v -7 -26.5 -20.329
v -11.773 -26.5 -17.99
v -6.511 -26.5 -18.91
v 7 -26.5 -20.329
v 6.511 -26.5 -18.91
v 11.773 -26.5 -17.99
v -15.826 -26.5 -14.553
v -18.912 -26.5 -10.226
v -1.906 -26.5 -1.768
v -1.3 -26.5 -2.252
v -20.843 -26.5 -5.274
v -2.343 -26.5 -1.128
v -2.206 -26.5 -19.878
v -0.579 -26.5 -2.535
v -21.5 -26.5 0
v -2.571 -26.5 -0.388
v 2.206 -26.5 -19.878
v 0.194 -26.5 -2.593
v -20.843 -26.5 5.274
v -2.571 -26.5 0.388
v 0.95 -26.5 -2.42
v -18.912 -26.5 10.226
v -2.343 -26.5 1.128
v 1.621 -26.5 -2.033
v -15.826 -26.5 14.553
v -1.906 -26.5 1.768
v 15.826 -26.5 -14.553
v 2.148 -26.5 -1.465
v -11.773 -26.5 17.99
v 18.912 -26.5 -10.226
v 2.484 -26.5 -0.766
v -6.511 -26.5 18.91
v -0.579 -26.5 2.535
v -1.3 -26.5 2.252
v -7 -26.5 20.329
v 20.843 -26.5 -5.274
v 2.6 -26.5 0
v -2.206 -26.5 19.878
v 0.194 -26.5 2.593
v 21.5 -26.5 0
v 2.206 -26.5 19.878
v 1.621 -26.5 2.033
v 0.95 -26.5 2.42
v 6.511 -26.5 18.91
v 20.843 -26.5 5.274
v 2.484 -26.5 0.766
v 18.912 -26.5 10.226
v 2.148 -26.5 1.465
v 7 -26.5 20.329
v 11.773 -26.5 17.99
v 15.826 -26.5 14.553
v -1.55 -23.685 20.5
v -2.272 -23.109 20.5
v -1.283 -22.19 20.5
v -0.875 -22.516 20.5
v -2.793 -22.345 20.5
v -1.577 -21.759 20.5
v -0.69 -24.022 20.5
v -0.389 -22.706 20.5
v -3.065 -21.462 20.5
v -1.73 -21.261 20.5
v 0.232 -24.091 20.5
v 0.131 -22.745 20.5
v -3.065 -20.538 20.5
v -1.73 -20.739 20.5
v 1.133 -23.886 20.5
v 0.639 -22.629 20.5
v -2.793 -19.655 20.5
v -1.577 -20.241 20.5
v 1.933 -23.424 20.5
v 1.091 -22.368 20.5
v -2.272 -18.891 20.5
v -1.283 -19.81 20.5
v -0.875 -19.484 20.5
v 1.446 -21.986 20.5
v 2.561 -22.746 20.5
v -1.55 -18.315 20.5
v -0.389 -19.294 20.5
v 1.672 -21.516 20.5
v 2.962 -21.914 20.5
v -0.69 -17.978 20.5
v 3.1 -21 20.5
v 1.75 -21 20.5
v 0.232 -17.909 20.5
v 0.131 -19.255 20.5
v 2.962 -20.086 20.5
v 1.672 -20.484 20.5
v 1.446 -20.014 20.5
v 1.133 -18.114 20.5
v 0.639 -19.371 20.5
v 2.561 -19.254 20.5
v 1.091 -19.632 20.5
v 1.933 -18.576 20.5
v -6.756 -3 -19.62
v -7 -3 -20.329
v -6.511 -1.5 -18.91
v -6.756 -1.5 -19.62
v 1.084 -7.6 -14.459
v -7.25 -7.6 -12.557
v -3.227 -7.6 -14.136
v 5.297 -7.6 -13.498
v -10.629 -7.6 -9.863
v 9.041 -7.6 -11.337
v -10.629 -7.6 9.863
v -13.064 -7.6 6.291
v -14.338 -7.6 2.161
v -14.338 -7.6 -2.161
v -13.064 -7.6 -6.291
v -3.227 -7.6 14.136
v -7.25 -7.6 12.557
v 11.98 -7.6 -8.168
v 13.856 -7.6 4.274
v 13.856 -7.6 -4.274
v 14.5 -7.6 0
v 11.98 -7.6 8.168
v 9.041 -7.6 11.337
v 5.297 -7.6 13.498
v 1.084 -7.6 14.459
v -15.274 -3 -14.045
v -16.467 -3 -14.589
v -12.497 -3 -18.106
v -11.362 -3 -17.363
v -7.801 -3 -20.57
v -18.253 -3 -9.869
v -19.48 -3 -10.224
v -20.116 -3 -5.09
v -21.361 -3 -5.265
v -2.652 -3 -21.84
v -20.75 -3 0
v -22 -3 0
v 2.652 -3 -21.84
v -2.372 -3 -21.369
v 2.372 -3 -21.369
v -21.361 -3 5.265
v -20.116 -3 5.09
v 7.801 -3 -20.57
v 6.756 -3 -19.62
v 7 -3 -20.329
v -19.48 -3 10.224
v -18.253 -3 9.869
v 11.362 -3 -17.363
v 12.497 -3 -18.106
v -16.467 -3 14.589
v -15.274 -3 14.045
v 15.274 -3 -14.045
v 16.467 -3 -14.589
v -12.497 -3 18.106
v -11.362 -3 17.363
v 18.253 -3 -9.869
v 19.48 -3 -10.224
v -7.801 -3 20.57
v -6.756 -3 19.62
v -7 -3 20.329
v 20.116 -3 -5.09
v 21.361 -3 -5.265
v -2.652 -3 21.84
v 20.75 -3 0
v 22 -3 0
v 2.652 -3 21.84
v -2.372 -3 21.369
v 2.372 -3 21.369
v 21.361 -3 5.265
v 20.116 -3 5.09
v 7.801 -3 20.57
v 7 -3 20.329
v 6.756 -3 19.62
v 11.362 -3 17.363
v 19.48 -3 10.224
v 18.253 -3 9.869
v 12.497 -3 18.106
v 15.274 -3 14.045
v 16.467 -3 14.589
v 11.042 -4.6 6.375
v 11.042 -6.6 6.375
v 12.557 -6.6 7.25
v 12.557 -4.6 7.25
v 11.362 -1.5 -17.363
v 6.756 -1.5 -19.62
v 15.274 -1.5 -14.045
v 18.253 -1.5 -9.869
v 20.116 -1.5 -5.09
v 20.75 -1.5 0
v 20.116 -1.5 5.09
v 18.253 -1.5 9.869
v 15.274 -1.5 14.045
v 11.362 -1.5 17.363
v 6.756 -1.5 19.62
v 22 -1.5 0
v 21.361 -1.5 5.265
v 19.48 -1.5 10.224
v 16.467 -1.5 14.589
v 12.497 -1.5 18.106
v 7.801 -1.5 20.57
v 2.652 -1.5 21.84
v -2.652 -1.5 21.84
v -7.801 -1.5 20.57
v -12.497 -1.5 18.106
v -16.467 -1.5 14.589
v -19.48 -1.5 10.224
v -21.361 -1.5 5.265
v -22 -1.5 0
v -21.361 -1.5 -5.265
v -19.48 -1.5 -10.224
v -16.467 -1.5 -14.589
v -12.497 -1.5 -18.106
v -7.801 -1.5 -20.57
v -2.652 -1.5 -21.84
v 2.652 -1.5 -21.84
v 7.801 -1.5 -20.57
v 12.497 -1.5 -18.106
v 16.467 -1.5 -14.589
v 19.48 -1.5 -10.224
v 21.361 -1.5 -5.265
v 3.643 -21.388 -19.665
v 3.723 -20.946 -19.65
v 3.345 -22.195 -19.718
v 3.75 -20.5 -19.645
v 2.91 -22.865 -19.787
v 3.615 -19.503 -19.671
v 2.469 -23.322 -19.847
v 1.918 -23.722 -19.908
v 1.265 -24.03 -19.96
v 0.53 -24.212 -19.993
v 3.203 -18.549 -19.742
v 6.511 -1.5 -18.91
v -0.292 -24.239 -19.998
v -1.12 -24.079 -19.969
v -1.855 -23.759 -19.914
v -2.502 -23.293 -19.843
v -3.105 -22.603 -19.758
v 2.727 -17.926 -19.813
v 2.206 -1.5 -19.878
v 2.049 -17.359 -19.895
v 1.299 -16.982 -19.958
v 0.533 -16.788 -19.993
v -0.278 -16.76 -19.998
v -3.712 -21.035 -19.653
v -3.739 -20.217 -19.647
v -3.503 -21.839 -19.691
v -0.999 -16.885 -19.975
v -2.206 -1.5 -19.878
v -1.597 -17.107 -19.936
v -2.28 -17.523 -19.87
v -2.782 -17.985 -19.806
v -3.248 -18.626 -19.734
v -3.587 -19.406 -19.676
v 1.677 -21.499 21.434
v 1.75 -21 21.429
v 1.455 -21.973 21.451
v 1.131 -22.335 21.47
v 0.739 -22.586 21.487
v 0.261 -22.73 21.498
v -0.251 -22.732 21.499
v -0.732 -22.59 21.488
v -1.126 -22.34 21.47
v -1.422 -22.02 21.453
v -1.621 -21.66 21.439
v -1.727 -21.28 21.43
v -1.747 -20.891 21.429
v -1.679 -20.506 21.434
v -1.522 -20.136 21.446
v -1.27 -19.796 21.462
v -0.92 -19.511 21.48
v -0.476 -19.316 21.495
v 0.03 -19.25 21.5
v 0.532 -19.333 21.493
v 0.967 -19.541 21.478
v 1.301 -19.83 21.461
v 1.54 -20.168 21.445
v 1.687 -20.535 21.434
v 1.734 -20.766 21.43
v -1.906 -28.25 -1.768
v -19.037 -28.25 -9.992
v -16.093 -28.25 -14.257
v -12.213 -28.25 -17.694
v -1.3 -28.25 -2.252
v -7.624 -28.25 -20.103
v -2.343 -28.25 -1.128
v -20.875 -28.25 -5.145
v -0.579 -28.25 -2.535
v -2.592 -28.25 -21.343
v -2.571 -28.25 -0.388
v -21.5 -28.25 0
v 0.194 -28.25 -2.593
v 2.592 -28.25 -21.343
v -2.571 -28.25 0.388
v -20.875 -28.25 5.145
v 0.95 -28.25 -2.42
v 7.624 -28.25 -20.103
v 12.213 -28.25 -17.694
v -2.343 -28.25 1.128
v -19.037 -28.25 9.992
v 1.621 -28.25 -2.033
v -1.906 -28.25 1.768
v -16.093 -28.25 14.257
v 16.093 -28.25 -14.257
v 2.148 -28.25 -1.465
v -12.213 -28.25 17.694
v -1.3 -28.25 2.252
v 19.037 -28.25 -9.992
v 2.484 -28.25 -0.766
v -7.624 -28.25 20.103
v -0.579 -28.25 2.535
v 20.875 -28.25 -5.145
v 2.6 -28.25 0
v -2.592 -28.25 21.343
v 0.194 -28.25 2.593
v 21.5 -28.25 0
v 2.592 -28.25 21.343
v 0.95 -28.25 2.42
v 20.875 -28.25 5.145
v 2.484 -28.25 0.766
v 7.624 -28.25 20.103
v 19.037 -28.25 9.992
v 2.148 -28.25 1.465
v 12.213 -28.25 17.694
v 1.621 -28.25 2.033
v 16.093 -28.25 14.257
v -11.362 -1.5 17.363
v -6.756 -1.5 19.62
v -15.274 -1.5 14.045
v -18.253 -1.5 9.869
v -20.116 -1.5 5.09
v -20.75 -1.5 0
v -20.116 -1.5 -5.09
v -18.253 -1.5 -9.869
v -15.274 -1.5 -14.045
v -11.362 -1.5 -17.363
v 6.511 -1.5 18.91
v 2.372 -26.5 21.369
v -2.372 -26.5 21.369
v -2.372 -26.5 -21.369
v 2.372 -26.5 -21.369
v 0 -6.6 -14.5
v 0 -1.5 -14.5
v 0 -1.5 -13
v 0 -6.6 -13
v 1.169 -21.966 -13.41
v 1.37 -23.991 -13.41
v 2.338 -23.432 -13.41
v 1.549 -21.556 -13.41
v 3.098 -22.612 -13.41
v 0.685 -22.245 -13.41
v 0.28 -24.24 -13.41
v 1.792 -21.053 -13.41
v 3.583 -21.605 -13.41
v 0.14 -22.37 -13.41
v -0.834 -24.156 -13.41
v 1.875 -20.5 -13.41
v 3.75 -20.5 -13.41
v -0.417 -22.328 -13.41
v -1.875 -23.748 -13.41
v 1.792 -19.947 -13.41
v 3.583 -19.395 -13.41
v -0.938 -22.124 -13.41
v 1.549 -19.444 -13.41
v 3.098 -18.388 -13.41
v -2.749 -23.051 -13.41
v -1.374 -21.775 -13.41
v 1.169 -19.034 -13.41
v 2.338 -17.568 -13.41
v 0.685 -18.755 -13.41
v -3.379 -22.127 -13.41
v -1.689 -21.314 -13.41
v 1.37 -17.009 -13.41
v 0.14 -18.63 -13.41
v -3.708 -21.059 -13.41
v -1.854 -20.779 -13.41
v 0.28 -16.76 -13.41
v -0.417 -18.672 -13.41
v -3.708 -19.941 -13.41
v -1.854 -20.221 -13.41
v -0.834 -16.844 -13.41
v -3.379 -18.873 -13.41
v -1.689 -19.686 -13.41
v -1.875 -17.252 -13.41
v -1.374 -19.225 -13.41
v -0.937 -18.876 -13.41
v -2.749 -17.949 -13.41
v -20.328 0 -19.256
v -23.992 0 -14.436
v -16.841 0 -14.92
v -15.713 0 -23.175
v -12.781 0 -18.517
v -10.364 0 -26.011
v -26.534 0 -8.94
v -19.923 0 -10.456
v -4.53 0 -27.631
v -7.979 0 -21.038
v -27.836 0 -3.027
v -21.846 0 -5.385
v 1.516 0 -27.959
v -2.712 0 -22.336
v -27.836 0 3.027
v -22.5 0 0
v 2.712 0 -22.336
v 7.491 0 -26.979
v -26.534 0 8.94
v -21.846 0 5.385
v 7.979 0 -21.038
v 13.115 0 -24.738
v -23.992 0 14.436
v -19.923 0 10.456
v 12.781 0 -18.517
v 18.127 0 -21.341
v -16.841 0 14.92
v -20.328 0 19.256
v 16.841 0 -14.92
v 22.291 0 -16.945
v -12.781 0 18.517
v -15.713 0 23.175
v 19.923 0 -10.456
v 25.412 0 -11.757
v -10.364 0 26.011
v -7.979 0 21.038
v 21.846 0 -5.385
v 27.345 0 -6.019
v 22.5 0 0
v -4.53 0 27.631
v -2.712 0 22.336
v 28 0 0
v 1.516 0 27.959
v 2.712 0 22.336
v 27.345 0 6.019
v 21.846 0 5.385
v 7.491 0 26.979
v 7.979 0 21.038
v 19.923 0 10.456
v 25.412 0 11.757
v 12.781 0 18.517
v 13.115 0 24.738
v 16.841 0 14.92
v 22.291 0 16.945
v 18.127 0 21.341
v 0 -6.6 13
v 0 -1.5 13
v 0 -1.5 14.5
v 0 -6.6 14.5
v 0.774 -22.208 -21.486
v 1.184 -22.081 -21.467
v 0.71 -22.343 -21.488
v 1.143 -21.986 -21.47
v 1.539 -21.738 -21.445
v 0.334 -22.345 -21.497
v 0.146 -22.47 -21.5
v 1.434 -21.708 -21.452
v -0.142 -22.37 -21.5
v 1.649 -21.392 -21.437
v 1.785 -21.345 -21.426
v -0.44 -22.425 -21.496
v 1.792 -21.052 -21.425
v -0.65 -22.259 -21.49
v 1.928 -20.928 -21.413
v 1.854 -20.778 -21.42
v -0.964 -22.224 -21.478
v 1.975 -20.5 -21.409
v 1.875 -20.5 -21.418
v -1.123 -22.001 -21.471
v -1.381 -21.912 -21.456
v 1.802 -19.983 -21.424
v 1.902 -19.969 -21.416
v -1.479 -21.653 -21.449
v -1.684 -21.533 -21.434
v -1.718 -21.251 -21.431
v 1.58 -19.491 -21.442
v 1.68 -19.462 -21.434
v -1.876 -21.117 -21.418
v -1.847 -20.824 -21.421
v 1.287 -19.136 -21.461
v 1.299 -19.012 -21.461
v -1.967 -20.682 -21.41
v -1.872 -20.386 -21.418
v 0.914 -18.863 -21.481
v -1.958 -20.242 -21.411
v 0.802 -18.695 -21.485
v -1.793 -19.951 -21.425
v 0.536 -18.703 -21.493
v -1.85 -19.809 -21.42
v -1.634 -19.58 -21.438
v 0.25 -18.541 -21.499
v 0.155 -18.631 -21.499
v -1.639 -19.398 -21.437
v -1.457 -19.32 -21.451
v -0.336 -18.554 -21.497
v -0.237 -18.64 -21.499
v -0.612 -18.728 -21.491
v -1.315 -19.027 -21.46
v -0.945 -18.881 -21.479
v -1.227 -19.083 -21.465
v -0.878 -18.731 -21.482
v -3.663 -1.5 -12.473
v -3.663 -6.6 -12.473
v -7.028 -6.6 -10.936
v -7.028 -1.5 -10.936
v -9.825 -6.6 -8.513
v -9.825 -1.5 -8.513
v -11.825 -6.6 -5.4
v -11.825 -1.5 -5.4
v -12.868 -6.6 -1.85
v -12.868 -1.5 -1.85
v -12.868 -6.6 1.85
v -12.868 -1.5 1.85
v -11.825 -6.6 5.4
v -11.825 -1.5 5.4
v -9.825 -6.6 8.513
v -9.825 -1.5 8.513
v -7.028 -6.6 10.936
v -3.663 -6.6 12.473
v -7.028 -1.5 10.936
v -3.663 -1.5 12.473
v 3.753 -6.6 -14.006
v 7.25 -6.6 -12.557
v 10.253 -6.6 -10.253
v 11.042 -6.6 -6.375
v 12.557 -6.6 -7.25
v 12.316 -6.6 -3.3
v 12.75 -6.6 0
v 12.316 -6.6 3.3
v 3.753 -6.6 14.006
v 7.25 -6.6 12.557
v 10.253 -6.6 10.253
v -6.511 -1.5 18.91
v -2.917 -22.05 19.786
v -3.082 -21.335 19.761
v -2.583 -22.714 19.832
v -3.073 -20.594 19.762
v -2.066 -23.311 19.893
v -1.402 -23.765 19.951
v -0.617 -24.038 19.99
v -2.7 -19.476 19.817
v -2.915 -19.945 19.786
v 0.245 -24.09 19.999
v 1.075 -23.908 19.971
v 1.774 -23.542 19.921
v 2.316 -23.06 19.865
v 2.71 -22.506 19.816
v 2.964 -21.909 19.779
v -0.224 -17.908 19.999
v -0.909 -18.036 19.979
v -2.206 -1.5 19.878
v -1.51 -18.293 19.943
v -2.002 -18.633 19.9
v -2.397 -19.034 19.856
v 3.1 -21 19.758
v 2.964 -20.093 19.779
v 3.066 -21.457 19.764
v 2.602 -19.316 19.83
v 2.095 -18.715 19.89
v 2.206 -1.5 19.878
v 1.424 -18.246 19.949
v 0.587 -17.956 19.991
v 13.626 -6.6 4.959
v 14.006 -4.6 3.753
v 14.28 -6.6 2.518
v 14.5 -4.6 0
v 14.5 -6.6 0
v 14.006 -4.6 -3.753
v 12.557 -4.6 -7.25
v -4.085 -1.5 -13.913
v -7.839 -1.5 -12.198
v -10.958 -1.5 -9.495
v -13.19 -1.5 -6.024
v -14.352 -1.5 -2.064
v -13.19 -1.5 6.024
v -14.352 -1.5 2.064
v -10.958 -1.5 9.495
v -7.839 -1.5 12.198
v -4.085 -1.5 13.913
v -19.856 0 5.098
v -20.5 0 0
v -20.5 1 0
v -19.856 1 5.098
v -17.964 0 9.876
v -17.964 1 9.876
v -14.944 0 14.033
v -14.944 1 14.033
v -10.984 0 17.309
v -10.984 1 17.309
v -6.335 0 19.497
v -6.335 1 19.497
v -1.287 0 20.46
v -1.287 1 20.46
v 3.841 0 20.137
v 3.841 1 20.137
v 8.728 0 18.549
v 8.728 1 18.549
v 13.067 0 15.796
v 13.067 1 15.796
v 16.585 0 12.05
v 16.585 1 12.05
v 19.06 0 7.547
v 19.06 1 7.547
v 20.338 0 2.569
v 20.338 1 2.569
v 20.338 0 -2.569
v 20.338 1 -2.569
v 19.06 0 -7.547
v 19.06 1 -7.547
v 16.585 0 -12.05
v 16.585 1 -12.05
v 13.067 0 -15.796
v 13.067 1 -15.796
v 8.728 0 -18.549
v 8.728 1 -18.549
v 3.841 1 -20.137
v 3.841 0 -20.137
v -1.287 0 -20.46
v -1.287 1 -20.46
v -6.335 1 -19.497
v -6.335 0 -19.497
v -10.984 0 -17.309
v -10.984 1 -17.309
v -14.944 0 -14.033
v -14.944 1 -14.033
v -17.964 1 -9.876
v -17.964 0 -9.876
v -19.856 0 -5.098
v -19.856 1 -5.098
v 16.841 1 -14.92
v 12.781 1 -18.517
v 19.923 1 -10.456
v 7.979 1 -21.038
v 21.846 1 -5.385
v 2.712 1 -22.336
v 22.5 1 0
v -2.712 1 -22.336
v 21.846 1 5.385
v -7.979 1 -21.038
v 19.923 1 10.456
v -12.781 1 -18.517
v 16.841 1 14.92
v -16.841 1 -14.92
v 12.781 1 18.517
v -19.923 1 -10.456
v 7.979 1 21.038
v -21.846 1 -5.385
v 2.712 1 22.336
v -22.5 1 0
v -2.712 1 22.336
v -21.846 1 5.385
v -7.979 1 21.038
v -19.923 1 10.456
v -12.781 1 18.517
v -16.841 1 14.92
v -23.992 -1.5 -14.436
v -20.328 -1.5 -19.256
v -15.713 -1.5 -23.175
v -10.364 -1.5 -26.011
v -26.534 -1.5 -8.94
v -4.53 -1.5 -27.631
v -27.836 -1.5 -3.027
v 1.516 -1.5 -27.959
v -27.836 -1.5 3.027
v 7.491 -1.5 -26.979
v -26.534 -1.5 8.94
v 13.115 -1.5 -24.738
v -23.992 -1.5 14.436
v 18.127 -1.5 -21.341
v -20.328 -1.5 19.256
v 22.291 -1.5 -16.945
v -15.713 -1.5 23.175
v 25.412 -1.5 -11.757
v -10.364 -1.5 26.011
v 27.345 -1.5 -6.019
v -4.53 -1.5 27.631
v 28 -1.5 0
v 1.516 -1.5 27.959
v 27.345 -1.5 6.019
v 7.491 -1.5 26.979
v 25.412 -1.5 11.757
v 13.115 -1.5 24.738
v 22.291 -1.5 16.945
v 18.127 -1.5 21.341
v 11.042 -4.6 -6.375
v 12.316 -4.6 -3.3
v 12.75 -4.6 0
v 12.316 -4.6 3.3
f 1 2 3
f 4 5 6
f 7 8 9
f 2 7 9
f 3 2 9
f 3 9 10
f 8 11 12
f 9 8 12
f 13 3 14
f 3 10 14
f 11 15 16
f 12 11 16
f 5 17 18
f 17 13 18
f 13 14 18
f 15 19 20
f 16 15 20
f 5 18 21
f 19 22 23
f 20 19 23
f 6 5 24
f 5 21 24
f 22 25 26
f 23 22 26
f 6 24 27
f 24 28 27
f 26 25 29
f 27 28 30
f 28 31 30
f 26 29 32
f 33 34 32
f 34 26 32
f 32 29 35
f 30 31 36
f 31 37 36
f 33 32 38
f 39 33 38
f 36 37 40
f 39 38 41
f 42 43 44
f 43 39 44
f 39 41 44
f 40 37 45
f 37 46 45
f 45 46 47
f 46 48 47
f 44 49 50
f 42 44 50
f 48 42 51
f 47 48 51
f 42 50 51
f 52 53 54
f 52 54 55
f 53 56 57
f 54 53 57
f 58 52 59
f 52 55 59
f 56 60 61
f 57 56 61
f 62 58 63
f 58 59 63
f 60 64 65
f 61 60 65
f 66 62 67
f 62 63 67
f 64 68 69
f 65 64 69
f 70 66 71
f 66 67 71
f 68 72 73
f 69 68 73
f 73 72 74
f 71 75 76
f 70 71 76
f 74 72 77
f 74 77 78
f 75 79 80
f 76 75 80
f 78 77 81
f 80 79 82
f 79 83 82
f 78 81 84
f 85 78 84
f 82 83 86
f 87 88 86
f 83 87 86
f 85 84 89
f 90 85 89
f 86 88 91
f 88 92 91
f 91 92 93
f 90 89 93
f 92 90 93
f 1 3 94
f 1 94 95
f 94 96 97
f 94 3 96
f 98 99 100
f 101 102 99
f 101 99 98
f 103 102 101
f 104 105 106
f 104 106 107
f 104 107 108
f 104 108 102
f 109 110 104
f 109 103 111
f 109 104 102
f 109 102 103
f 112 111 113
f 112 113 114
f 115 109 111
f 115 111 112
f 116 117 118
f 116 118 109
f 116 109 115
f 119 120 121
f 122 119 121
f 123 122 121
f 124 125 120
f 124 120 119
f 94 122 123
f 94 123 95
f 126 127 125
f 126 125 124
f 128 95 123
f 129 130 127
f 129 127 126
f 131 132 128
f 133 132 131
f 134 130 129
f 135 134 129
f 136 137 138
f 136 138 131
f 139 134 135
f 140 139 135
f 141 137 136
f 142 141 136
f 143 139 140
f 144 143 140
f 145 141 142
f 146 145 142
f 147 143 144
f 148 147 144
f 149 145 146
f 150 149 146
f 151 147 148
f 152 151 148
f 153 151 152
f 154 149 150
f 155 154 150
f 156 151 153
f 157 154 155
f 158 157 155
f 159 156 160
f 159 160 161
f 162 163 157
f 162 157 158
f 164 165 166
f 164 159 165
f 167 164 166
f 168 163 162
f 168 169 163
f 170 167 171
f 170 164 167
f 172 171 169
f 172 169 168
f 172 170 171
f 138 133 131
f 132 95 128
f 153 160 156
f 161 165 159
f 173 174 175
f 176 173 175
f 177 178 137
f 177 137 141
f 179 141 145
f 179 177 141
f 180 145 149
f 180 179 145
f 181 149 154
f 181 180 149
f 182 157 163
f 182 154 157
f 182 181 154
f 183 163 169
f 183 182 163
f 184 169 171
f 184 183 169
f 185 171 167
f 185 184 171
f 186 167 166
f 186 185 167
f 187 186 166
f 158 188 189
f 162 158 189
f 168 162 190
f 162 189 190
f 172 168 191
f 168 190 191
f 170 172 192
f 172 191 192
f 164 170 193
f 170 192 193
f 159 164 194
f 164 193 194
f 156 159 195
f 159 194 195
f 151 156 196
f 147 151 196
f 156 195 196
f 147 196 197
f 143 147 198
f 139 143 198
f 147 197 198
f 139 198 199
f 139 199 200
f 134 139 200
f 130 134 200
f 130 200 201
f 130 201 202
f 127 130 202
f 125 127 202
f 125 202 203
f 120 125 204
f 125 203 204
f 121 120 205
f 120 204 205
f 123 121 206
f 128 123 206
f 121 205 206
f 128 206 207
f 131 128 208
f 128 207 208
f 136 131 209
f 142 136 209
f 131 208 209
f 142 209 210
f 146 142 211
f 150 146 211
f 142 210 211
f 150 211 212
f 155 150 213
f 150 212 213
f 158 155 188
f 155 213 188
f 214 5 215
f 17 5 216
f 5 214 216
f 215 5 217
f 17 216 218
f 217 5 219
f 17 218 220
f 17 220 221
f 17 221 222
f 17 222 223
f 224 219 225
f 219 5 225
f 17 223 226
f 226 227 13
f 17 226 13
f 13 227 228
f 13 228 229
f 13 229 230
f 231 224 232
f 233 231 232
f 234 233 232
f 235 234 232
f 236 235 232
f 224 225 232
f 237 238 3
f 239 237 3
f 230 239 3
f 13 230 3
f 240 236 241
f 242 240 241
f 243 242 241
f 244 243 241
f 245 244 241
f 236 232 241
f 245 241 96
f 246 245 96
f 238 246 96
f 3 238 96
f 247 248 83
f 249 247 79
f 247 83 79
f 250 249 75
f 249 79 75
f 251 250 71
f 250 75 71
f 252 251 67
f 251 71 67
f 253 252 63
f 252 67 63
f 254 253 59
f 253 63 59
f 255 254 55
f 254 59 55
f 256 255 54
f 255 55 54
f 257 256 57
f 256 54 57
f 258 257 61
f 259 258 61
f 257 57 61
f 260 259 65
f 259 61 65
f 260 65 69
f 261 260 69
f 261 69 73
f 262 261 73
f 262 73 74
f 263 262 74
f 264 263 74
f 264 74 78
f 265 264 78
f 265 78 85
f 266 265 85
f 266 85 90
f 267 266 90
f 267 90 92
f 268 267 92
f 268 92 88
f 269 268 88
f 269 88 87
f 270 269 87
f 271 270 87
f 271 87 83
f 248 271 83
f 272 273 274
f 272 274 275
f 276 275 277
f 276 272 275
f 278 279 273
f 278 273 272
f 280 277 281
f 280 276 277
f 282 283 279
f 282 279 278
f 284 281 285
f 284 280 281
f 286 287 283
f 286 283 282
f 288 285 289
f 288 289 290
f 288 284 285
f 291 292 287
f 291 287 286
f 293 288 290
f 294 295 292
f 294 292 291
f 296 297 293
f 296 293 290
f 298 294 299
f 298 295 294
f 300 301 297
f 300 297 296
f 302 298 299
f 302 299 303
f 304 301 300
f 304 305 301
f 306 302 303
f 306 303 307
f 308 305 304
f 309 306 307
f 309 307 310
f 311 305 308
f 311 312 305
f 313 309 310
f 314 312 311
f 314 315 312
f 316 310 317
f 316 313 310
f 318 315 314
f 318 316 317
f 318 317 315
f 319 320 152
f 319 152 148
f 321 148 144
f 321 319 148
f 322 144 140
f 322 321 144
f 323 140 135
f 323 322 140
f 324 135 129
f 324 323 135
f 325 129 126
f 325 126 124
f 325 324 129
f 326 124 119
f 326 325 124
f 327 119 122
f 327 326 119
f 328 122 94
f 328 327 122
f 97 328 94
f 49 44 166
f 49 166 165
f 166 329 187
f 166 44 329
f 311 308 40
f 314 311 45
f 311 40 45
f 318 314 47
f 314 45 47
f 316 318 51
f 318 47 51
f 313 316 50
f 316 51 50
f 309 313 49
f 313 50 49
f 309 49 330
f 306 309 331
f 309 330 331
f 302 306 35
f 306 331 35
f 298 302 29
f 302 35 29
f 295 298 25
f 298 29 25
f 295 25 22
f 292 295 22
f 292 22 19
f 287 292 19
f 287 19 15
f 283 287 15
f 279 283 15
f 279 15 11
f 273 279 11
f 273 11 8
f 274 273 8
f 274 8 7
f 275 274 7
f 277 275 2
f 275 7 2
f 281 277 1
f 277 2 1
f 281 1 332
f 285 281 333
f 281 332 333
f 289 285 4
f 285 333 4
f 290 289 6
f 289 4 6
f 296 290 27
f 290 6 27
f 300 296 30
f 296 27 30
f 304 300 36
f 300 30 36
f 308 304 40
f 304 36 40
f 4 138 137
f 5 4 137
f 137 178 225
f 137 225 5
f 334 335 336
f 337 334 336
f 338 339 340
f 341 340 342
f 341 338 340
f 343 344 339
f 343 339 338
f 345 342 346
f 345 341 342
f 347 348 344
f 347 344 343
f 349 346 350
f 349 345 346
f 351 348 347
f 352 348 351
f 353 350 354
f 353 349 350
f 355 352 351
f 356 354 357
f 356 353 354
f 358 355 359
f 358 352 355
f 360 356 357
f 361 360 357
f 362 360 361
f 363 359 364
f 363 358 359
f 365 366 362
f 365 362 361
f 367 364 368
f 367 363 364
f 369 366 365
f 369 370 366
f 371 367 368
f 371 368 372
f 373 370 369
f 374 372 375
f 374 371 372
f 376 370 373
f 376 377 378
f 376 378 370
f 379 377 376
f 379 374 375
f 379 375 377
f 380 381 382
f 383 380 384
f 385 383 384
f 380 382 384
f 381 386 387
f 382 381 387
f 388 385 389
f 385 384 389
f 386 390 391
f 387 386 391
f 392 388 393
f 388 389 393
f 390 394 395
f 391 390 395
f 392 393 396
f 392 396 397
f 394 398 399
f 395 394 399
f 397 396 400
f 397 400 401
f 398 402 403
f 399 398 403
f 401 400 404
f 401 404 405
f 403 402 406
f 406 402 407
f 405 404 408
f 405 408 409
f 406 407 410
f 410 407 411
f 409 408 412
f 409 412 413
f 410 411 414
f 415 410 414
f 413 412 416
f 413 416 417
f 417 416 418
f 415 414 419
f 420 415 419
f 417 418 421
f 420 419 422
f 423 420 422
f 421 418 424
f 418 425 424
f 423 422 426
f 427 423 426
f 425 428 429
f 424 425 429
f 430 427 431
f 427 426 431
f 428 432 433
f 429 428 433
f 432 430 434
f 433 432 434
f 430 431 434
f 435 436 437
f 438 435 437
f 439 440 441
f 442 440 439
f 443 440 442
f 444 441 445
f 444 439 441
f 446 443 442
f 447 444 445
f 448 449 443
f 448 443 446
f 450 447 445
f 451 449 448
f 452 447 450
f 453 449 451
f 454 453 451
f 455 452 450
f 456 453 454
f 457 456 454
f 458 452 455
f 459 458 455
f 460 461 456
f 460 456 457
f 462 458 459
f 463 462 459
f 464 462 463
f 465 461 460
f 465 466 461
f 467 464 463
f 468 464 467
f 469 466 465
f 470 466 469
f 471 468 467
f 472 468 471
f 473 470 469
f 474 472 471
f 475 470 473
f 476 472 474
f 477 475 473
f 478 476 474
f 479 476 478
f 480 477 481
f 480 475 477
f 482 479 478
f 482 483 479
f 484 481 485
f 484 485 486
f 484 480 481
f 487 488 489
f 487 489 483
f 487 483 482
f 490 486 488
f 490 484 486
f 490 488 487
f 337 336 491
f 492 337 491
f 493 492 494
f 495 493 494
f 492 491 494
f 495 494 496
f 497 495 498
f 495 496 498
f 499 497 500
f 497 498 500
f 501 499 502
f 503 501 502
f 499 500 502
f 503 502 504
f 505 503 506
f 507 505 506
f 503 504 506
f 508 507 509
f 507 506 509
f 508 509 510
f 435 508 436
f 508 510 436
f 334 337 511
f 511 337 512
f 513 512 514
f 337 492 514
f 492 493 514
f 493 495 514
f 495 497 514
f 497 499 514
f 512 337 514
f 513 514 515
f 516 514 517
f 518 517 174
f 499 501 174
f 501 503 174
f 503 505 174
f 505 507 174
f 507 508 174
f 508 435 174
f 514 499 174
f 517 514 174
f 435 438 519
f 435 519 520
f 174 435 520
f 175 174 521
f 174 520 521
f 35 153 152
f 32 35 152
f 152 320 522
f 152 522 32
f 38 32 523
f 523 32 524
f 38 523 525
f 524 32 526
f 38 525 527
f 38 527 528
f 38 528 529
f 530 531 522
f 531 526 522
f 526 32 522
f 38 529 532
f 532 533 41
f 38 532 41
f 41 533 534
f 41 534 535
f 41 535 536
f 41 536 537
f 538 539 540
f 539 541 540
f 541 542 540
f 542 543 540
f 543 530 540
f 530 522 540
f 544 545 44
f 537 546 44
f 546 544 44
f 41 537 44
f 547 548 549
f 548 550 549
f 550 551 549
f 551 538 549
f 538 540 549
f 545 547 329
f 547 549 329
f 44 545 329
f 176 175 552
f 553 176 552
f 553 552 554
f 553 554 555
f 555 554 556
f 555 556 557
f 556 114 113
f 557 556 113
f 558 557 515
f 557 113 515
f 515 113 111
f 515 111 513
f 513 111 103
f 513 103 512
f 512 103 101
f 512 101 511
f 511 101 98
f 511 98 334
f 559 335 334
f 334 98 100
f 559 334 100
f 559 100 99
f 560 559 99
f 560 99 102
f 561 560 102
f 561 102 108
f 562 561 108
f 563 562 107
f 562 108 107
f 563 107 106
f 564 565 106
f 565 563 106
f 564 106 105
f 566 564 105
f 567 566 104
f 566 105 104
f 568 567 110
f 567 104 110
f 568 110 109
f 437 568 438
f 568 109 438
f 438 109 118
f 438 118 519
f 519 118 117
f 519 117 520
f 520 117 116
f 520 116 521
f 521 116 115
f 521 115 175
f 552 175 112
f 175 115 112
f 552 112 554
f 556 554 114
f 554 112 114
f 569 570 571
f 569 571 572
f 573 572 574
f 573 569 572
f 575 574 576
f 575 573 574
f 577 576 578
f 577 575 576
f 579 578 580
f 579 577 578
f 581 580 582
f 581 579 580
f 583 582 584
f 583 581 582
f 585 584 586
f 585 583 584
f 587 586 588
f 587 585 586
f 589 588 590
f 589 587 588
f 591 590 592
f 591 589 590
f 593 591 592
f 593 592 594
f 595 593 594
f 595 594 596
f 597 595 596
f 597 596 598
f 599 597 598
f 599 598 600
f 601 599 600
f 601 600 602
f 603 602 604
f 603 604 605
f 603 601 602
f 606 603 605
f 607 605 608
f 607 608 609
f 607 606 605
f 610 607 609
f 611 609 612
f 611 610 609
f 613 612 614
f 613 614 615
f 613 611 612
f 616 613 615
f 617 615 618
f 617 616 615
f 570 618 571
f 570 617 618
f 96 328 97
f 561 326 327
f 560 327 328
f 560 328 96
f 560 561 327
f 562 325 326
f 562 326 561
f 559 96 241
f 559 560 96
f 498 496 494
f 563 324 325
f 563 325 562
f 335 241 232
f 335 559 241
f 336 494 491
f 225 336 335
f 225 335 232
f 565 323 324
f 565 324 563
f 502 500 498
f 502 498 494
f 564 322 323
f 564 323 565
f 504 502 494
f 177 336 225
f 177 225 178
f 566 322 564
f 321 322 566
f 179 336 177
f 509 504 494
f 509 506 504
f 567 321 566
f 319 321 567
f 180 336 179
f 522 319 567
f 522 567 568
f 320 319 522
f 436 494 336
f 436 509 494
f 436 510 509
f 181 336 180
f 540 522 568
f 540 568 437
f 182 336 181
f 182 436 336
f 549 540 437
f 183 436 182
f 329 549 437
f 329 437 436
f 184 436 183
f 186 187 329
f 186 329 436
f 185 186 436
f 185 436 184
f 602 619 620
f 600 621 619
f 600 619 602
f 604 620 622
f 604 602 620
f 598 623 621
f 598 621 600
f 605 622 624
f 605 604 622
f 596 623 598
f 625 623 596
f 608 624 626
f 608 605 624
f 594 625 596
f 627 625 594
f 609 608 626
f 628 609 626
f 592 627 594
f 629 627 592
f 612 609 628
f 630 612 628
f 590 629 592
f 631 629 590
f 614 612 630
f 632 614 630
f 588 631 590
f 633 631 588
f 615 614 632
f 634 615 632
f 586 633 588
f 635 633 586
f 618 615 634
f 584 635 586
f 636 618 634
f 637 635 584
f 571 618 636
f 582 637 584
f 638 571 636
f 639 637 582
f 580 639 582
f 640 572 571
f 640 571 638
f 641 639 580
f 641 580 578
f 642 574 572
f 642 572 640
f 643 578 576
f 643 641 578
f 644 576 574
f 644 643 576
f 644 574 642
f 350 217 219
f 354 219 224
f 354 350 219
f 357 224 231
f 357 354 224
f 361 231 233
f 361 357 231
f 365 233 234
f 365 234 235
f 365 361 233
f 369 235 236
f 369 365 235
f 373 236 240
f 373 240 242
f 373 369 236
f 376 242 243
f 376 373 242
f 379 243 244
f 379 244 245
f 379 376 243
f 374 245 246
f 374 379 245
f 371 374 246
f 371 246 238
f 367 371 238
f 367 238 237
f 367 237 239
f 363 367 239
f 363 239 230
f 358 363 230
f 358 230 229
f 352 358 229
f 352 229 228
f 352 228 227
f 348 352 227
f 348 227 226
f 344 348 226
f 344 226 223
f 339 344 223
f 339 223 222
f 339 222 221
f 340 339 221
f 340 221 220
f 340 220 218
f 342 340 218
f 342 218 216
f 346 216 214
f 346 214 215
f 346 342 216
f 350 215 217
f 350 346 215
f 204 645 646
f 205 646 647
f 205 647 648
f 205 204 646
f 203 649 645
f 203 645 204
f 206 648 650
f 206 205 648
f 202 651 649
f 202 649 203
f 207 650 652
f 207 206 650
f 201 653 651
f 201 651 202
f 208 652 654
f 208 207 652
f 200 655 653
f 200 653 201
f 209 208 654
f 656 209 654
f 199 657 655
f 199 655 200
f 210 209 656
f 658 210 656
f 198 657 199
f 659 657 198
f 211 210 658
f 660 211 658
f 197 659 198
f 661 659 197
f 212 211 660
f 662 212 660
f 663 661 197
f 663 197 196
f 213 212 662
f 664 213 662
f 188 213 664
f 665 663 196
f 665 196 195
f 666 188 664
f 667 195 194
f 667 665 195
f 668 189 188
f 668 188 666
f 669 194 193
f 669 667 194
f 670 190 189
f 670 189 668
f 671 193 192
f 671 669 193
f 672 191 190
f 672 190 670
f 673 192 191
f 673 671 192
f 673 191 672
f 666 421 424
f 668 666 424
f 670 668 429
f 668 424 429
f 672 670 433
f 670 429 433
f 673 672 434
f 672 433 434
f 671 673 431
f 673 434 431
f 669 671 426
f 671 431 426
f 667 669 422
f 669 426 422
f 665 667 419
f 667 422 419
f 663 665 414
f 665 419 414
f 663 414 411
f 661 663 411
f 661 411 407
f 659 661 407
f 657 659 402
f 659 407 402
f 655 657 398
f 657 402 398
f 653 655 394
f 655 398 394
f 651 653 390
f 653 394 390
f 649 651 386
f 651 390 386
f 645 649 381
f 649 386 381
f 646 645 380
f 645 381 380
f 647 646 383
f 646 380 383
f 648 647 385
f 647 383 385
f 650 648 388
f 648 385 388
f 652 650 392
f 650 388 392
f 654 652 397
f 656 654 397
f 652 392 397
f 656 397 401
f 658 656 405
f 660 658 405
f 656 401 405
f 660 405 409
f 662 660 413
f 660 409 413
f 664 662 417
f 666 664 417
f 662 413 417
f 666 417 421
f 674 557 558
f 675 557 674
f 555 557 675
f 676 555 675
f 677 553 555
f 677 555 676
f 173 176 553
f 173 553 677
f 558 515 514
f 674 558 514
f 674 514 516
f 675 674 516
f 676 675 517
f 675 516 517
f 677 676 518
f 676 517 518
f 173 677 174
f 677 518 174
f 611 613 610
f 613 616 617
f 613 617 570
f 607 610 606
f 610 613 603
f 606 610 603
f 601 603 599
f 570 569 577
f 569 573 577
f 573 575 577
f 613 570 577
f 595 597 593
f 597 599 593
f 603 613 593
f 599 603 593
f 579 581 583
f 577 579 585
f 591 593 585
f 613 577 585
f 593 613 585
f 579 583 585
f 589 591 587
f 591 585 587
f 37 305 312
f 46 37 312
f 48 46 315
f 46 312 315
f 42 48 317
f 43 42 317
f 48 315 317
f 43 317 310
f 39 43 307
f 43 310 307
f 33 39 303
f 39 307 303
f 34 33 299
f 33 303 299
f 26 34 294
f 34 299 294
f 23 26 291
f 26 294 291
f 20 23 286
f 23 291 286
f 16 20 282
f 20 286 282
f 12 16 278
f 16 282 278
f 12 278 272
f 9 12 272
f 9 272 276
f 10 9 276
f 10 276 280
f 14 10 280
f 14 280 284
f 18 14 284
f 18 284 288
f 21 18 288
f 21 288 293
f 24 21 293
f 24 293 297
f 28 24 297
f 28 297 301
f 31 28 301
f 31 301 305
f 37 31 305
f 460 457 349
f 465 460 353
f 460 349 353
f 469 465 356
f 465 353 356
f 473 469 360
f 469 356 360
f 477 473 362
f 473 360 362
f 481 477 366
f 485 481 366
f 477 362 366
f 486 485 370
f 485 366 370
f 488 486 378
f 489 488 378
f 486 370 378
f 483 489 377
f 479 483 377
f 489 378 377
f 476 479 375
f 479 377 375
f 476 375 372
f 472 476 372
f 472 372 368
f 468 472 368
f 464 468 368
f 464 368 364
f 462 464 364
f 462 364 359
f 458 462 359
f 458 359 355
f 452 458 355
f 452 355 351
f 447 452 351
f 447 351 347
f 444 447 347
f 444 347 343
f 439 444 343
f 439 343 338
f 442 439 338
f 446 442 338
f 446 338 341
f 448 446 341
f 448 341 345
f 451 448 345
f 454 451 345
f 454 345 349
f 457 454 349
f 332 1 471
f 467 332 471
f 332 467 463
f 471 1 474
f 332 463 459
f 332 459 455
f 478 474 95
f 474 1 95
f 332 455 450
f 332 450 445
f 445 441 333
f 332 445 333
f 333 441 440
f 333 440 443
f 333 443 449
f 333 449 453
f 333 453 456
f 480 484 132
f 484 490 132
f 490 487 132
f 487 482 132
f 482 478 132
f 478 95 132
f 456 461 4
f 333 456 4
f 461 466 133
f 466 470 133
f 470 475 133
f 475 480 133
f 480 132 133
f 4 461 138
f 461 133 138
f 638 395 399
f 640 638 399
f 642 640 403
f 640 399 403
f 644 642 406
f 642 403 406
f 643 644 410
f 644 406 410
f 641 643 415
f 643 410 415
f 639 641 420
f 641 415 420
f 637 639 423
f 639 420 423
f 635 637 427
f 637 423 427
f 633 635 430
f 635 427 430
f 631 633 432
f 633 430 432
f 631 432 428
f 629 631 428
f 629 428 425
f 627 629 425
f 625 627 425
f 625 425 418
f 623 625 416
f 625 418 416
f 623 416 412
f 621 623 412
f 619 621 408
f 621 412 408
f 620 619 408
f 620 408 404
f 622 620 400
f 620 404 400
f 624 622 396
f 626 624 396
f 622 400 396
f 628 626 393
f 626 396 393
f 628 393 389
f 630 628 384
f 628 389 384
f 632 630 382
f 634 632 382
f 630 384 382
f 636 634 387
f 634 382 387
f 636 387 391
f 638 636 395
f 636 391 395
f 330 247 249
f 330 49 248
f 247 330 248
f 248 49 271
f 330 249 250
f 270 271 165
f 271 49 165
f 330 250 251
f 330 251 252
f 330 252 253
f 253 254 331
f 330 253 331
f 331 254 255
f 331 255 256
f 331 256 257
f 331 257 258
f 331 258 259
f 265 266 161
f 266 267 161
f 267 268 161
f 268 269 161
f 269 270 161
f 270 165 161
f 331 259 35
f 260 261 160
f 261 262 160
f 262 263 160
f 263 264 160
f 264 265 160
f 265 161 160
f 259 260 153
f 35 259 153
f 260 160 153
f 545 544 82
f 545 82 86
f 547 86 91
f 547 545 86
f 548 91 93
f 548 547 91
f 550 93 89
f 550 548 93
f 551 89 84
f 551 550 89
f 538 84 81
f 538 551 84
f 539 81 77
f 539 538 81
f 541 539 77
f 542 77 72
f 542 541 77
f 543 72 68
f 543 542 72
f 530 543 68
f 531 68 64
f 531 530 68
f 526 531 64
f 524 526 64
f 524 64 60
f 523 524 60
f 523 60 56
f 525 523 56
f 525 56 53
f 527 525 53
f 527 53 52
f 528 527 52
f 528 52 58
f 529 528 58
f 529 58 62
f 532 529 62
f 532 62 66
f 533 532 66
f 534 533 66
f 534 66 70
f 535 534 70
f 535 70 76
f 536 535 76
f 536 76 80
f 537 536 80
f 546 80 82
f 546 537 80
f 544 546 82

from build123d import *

# Parameters (mm, degrees)
F0_R           = 28
F1_DEPTH       = 1.5
F3_DEPTH       = 5.1
F5_DEPTH       = 25
F6_R           = 21.5
F7_DEPTH       = 1.75
F8_R           = 2.6
F9_DEPTH       = 25
F10_R          = 1.975
F11_DEPTH      = 30
F13_END_RADIUS = 21.5
F12_R          = 3.75
F12_R_2        = 1.875
F13_REACH      = 38.6076017178
F14_W          = 15
F14_H          = 26.820743024
F15_DEPTH      = 25
F15_DEPTH_BACK = 25
F16_R          = 14.5
F17_DEPTH      = 1
F19_DEPTH      = 2
F21_R          = 22.5
F21_R_2        = 20.5
F22_DEPTH      = 1
F23_R          = 22
F23_R_2        = 20.75
F24_DEPTH      = 1.5
F25_R          = 3.1
F26_DEPTH      = 5.5
F27_R          = 1.75
F28_REACH      = 12.4507474683
F29_R          = 30
F29_R_2        = 29
F30_DEPTH      = 25


with BuildPart() as f1:
    # F0 (on Front) → F1 (new body)
    with BuildSketch(Plane.XZ):
        Circle(F0_R)
    extrude(amount=F1_DEPTH)

    # F2 (on face) → F3 (join)
    with BuildSketch(Plane.XZ.offset(1.5)):
        with BuildLine():
            ThreePointArc((0, -13), (-13, 0), (0, 13))
            Line((0, 13), (0, 14.5))
            ThreePointArc((0, 14.5), (-14.5, 0), (0, -14.5))
            Line((0, -14.5), (0, -13))
        make_face()
    extrude(amount=F3_DEPTH)

    # F4 (on face) → F5 (join)
    with BuildSketch(Plane.XZ.offset(1.5)):
        with BuildLine():
            Line((6.5113630891, 18.910371512), (6.9997153208, 20.3286493754))
            ThreePointArc((6.9997153208, 20.3286493754), (0, 21.5), (-6.9997153208, 20.3286493754))
            Line((-6.9997153208, 20.3286493754), (-6.5113630891, 18.910371512))
            ThreePointArc((-6.5113630891, 18.910371512), (0, 20), (6.5113630891, 18.910371512))
        make_face()
        with BuildLine():
            ThreePointArc((6.5113630891, -18.910371512), (0, -20), (-6.5113630891, -18.910371512))
            Line((-6.5113630891, -18.910371512), (-6.9997153208, -20.3286493754))
            ThreePointArc((-6.9997153208, -20.3286493754), (0, -21.5), (6.9997153208, -20.3286493754))
            Line((6.9997153208, -20.3286493754), (6.5113630891, -18.910371512))
        make_face()
    extrude(amount=F5_DEPTH)

    # F6 (on face) → F7 (join)
    with BuildSketch(Plane.XZ.offset(26.5)):
        Circle(F6_R)
    extrude(amount=F7_DEPTH)

    # F8 (on face) → F9 (cut)
    with BuildSketch(Plane.XZ.offset(28.25)):
        Circle(F8_R)
    extrude(amount=-F9_DEPTH, mode=Mode.SUBTRACT)

    # F10 (on Top) → F11 (cut)
    with BuildSketch(Plane.XY):
        with Locations((0, -20.5)):
            Circle(F10_R)
    extrude(amount=-F11_DEPTH, mode=Mode.SUBTRACT)

    f13_end = (Plane.ZX.offset(-14) * Cylinder(F13_END_RADIUS, 245.3825308212, mode=Mode.PRIVATE)).faces().sort_by_distance((0, -14, -21.5))[0]
    # F12 (on Top) → F13 (join, up to the whole of a round face its end follows)
    with BuildSketch(Plane.XY):
        with Locations((0, -20.5)):
            Circle(F12_R)
        with Locations((0, -20.5)):
            Circle(F12_R_2, mode=Mode.SUBTRACT)
    f13_long = extrude(amount=-F13_REACH, mode=Mode.PRIVATE)
    add(split(f13_long, bisect_by=f13_end, keep=Keep.BOTTOM, mode=Mode.PRIVATE))

    # F14 (on Right) → F15 (cut, two sides)
    with BuildSketch(Plane.YZ) as f15_sk:
        with Locations((-17.75, 0)):
            Rectangle(F14_W, F14_H)
    extrude(amount=-F15_DEPTH, mode=Mode.SUBTRACT)
    extrude(f15_sk.sketch, amount=F15_DEPTH_BACK, mode=Mode.SUBTRACT)

    # F16 (on face) → F17 (join)
    with BuildSketch(Plane.XZ.offset(6.6)):
        Circle(F16_R)
    extrude(amount=F17_DEPTH)

    # F18 (on face) → F19 (join)
    with BuildSketch(Plane(origin=(0, -6.6, 0), x_dir=(-1, 0, 0), z_dir=(0, 1, 0))):
        with BuildLine():
            Line((-11.0418238983, 6.375), (-12.5573683549, 7.25))
            ThreePointArc((-12.5573683549, 7.25), (-14.5, 0), (-12.5573683549, -7.25))
            Line((-12.5573683549, -7.25), (-11.0418238983, -6.375))
            ThreePointArc((-11.0418238983, -6.375), (-12.75, 0), (-11.0418238983, 6.375))
        make_face()
    extrude(amount=F19_DEPTH)

    # F21 (on face) → F22 (join)
    with BuildSketch(Plane(origin=(0, 0, 0), x_dir=(-1, 0, 0), z_dir=(0, 1, 0))):
        Circle(F21_R)
        Circle(F21_R_2, mode=Mode.SUBTRACT)
    extrude(amount=F22_DEPTH)

    # F23 (on face) → F24 (join)
    with BuildSketch(Plane.XZ.offset(1.5)):
        Circle(F23_R)
        Circle(F23_R_2, mode=Mode.SUBTRACT)
    extrude(amount=F24_DEPTH)

    # F25 (on offset) → F26 (cut)
    with BuildSketch(Plane.XY.offset(15)):
        with Locations((0, -21)):
            Circle(F25_R)
    extrude(amount=F26_DEPTH, mode=Mode.SUBTRACT)

    f28_end = f1.faces().sort_by_distance((17.5034836447, -27.1584498842, 12.4851135478))[0]
    # F27 (on face) → F28 (cut, up to a face of the model that its end follows)
    with BuildSketch(Plane(origin=(0, 0, 20.5), x_dir=(1, 0, 0), z_dir=(0, 0, -1))):
        with Locations((0, 21)):
            Circle(F27_R)
    f28_long = extrude(amount=-F28_REACH, mode=Mode.PRIVATE)
    add(split(f28_long, bisect_by=f28_end, keep=Keep.BOTTOM, mode=Mode.PRIVATE), mode=Mode.SUBTRACT)

    # F29 (on face) → F30 (cut)
    with BuildSketch(Plane.XZ.offset(1.5)):
        Circle(F29_R)
        Circle(F29_R_2, mode=Mode.SUBTRACT)
    extrude(amount=F30_DEPTH, mode=Mode.SUBTRACT)


solid = f1.part
